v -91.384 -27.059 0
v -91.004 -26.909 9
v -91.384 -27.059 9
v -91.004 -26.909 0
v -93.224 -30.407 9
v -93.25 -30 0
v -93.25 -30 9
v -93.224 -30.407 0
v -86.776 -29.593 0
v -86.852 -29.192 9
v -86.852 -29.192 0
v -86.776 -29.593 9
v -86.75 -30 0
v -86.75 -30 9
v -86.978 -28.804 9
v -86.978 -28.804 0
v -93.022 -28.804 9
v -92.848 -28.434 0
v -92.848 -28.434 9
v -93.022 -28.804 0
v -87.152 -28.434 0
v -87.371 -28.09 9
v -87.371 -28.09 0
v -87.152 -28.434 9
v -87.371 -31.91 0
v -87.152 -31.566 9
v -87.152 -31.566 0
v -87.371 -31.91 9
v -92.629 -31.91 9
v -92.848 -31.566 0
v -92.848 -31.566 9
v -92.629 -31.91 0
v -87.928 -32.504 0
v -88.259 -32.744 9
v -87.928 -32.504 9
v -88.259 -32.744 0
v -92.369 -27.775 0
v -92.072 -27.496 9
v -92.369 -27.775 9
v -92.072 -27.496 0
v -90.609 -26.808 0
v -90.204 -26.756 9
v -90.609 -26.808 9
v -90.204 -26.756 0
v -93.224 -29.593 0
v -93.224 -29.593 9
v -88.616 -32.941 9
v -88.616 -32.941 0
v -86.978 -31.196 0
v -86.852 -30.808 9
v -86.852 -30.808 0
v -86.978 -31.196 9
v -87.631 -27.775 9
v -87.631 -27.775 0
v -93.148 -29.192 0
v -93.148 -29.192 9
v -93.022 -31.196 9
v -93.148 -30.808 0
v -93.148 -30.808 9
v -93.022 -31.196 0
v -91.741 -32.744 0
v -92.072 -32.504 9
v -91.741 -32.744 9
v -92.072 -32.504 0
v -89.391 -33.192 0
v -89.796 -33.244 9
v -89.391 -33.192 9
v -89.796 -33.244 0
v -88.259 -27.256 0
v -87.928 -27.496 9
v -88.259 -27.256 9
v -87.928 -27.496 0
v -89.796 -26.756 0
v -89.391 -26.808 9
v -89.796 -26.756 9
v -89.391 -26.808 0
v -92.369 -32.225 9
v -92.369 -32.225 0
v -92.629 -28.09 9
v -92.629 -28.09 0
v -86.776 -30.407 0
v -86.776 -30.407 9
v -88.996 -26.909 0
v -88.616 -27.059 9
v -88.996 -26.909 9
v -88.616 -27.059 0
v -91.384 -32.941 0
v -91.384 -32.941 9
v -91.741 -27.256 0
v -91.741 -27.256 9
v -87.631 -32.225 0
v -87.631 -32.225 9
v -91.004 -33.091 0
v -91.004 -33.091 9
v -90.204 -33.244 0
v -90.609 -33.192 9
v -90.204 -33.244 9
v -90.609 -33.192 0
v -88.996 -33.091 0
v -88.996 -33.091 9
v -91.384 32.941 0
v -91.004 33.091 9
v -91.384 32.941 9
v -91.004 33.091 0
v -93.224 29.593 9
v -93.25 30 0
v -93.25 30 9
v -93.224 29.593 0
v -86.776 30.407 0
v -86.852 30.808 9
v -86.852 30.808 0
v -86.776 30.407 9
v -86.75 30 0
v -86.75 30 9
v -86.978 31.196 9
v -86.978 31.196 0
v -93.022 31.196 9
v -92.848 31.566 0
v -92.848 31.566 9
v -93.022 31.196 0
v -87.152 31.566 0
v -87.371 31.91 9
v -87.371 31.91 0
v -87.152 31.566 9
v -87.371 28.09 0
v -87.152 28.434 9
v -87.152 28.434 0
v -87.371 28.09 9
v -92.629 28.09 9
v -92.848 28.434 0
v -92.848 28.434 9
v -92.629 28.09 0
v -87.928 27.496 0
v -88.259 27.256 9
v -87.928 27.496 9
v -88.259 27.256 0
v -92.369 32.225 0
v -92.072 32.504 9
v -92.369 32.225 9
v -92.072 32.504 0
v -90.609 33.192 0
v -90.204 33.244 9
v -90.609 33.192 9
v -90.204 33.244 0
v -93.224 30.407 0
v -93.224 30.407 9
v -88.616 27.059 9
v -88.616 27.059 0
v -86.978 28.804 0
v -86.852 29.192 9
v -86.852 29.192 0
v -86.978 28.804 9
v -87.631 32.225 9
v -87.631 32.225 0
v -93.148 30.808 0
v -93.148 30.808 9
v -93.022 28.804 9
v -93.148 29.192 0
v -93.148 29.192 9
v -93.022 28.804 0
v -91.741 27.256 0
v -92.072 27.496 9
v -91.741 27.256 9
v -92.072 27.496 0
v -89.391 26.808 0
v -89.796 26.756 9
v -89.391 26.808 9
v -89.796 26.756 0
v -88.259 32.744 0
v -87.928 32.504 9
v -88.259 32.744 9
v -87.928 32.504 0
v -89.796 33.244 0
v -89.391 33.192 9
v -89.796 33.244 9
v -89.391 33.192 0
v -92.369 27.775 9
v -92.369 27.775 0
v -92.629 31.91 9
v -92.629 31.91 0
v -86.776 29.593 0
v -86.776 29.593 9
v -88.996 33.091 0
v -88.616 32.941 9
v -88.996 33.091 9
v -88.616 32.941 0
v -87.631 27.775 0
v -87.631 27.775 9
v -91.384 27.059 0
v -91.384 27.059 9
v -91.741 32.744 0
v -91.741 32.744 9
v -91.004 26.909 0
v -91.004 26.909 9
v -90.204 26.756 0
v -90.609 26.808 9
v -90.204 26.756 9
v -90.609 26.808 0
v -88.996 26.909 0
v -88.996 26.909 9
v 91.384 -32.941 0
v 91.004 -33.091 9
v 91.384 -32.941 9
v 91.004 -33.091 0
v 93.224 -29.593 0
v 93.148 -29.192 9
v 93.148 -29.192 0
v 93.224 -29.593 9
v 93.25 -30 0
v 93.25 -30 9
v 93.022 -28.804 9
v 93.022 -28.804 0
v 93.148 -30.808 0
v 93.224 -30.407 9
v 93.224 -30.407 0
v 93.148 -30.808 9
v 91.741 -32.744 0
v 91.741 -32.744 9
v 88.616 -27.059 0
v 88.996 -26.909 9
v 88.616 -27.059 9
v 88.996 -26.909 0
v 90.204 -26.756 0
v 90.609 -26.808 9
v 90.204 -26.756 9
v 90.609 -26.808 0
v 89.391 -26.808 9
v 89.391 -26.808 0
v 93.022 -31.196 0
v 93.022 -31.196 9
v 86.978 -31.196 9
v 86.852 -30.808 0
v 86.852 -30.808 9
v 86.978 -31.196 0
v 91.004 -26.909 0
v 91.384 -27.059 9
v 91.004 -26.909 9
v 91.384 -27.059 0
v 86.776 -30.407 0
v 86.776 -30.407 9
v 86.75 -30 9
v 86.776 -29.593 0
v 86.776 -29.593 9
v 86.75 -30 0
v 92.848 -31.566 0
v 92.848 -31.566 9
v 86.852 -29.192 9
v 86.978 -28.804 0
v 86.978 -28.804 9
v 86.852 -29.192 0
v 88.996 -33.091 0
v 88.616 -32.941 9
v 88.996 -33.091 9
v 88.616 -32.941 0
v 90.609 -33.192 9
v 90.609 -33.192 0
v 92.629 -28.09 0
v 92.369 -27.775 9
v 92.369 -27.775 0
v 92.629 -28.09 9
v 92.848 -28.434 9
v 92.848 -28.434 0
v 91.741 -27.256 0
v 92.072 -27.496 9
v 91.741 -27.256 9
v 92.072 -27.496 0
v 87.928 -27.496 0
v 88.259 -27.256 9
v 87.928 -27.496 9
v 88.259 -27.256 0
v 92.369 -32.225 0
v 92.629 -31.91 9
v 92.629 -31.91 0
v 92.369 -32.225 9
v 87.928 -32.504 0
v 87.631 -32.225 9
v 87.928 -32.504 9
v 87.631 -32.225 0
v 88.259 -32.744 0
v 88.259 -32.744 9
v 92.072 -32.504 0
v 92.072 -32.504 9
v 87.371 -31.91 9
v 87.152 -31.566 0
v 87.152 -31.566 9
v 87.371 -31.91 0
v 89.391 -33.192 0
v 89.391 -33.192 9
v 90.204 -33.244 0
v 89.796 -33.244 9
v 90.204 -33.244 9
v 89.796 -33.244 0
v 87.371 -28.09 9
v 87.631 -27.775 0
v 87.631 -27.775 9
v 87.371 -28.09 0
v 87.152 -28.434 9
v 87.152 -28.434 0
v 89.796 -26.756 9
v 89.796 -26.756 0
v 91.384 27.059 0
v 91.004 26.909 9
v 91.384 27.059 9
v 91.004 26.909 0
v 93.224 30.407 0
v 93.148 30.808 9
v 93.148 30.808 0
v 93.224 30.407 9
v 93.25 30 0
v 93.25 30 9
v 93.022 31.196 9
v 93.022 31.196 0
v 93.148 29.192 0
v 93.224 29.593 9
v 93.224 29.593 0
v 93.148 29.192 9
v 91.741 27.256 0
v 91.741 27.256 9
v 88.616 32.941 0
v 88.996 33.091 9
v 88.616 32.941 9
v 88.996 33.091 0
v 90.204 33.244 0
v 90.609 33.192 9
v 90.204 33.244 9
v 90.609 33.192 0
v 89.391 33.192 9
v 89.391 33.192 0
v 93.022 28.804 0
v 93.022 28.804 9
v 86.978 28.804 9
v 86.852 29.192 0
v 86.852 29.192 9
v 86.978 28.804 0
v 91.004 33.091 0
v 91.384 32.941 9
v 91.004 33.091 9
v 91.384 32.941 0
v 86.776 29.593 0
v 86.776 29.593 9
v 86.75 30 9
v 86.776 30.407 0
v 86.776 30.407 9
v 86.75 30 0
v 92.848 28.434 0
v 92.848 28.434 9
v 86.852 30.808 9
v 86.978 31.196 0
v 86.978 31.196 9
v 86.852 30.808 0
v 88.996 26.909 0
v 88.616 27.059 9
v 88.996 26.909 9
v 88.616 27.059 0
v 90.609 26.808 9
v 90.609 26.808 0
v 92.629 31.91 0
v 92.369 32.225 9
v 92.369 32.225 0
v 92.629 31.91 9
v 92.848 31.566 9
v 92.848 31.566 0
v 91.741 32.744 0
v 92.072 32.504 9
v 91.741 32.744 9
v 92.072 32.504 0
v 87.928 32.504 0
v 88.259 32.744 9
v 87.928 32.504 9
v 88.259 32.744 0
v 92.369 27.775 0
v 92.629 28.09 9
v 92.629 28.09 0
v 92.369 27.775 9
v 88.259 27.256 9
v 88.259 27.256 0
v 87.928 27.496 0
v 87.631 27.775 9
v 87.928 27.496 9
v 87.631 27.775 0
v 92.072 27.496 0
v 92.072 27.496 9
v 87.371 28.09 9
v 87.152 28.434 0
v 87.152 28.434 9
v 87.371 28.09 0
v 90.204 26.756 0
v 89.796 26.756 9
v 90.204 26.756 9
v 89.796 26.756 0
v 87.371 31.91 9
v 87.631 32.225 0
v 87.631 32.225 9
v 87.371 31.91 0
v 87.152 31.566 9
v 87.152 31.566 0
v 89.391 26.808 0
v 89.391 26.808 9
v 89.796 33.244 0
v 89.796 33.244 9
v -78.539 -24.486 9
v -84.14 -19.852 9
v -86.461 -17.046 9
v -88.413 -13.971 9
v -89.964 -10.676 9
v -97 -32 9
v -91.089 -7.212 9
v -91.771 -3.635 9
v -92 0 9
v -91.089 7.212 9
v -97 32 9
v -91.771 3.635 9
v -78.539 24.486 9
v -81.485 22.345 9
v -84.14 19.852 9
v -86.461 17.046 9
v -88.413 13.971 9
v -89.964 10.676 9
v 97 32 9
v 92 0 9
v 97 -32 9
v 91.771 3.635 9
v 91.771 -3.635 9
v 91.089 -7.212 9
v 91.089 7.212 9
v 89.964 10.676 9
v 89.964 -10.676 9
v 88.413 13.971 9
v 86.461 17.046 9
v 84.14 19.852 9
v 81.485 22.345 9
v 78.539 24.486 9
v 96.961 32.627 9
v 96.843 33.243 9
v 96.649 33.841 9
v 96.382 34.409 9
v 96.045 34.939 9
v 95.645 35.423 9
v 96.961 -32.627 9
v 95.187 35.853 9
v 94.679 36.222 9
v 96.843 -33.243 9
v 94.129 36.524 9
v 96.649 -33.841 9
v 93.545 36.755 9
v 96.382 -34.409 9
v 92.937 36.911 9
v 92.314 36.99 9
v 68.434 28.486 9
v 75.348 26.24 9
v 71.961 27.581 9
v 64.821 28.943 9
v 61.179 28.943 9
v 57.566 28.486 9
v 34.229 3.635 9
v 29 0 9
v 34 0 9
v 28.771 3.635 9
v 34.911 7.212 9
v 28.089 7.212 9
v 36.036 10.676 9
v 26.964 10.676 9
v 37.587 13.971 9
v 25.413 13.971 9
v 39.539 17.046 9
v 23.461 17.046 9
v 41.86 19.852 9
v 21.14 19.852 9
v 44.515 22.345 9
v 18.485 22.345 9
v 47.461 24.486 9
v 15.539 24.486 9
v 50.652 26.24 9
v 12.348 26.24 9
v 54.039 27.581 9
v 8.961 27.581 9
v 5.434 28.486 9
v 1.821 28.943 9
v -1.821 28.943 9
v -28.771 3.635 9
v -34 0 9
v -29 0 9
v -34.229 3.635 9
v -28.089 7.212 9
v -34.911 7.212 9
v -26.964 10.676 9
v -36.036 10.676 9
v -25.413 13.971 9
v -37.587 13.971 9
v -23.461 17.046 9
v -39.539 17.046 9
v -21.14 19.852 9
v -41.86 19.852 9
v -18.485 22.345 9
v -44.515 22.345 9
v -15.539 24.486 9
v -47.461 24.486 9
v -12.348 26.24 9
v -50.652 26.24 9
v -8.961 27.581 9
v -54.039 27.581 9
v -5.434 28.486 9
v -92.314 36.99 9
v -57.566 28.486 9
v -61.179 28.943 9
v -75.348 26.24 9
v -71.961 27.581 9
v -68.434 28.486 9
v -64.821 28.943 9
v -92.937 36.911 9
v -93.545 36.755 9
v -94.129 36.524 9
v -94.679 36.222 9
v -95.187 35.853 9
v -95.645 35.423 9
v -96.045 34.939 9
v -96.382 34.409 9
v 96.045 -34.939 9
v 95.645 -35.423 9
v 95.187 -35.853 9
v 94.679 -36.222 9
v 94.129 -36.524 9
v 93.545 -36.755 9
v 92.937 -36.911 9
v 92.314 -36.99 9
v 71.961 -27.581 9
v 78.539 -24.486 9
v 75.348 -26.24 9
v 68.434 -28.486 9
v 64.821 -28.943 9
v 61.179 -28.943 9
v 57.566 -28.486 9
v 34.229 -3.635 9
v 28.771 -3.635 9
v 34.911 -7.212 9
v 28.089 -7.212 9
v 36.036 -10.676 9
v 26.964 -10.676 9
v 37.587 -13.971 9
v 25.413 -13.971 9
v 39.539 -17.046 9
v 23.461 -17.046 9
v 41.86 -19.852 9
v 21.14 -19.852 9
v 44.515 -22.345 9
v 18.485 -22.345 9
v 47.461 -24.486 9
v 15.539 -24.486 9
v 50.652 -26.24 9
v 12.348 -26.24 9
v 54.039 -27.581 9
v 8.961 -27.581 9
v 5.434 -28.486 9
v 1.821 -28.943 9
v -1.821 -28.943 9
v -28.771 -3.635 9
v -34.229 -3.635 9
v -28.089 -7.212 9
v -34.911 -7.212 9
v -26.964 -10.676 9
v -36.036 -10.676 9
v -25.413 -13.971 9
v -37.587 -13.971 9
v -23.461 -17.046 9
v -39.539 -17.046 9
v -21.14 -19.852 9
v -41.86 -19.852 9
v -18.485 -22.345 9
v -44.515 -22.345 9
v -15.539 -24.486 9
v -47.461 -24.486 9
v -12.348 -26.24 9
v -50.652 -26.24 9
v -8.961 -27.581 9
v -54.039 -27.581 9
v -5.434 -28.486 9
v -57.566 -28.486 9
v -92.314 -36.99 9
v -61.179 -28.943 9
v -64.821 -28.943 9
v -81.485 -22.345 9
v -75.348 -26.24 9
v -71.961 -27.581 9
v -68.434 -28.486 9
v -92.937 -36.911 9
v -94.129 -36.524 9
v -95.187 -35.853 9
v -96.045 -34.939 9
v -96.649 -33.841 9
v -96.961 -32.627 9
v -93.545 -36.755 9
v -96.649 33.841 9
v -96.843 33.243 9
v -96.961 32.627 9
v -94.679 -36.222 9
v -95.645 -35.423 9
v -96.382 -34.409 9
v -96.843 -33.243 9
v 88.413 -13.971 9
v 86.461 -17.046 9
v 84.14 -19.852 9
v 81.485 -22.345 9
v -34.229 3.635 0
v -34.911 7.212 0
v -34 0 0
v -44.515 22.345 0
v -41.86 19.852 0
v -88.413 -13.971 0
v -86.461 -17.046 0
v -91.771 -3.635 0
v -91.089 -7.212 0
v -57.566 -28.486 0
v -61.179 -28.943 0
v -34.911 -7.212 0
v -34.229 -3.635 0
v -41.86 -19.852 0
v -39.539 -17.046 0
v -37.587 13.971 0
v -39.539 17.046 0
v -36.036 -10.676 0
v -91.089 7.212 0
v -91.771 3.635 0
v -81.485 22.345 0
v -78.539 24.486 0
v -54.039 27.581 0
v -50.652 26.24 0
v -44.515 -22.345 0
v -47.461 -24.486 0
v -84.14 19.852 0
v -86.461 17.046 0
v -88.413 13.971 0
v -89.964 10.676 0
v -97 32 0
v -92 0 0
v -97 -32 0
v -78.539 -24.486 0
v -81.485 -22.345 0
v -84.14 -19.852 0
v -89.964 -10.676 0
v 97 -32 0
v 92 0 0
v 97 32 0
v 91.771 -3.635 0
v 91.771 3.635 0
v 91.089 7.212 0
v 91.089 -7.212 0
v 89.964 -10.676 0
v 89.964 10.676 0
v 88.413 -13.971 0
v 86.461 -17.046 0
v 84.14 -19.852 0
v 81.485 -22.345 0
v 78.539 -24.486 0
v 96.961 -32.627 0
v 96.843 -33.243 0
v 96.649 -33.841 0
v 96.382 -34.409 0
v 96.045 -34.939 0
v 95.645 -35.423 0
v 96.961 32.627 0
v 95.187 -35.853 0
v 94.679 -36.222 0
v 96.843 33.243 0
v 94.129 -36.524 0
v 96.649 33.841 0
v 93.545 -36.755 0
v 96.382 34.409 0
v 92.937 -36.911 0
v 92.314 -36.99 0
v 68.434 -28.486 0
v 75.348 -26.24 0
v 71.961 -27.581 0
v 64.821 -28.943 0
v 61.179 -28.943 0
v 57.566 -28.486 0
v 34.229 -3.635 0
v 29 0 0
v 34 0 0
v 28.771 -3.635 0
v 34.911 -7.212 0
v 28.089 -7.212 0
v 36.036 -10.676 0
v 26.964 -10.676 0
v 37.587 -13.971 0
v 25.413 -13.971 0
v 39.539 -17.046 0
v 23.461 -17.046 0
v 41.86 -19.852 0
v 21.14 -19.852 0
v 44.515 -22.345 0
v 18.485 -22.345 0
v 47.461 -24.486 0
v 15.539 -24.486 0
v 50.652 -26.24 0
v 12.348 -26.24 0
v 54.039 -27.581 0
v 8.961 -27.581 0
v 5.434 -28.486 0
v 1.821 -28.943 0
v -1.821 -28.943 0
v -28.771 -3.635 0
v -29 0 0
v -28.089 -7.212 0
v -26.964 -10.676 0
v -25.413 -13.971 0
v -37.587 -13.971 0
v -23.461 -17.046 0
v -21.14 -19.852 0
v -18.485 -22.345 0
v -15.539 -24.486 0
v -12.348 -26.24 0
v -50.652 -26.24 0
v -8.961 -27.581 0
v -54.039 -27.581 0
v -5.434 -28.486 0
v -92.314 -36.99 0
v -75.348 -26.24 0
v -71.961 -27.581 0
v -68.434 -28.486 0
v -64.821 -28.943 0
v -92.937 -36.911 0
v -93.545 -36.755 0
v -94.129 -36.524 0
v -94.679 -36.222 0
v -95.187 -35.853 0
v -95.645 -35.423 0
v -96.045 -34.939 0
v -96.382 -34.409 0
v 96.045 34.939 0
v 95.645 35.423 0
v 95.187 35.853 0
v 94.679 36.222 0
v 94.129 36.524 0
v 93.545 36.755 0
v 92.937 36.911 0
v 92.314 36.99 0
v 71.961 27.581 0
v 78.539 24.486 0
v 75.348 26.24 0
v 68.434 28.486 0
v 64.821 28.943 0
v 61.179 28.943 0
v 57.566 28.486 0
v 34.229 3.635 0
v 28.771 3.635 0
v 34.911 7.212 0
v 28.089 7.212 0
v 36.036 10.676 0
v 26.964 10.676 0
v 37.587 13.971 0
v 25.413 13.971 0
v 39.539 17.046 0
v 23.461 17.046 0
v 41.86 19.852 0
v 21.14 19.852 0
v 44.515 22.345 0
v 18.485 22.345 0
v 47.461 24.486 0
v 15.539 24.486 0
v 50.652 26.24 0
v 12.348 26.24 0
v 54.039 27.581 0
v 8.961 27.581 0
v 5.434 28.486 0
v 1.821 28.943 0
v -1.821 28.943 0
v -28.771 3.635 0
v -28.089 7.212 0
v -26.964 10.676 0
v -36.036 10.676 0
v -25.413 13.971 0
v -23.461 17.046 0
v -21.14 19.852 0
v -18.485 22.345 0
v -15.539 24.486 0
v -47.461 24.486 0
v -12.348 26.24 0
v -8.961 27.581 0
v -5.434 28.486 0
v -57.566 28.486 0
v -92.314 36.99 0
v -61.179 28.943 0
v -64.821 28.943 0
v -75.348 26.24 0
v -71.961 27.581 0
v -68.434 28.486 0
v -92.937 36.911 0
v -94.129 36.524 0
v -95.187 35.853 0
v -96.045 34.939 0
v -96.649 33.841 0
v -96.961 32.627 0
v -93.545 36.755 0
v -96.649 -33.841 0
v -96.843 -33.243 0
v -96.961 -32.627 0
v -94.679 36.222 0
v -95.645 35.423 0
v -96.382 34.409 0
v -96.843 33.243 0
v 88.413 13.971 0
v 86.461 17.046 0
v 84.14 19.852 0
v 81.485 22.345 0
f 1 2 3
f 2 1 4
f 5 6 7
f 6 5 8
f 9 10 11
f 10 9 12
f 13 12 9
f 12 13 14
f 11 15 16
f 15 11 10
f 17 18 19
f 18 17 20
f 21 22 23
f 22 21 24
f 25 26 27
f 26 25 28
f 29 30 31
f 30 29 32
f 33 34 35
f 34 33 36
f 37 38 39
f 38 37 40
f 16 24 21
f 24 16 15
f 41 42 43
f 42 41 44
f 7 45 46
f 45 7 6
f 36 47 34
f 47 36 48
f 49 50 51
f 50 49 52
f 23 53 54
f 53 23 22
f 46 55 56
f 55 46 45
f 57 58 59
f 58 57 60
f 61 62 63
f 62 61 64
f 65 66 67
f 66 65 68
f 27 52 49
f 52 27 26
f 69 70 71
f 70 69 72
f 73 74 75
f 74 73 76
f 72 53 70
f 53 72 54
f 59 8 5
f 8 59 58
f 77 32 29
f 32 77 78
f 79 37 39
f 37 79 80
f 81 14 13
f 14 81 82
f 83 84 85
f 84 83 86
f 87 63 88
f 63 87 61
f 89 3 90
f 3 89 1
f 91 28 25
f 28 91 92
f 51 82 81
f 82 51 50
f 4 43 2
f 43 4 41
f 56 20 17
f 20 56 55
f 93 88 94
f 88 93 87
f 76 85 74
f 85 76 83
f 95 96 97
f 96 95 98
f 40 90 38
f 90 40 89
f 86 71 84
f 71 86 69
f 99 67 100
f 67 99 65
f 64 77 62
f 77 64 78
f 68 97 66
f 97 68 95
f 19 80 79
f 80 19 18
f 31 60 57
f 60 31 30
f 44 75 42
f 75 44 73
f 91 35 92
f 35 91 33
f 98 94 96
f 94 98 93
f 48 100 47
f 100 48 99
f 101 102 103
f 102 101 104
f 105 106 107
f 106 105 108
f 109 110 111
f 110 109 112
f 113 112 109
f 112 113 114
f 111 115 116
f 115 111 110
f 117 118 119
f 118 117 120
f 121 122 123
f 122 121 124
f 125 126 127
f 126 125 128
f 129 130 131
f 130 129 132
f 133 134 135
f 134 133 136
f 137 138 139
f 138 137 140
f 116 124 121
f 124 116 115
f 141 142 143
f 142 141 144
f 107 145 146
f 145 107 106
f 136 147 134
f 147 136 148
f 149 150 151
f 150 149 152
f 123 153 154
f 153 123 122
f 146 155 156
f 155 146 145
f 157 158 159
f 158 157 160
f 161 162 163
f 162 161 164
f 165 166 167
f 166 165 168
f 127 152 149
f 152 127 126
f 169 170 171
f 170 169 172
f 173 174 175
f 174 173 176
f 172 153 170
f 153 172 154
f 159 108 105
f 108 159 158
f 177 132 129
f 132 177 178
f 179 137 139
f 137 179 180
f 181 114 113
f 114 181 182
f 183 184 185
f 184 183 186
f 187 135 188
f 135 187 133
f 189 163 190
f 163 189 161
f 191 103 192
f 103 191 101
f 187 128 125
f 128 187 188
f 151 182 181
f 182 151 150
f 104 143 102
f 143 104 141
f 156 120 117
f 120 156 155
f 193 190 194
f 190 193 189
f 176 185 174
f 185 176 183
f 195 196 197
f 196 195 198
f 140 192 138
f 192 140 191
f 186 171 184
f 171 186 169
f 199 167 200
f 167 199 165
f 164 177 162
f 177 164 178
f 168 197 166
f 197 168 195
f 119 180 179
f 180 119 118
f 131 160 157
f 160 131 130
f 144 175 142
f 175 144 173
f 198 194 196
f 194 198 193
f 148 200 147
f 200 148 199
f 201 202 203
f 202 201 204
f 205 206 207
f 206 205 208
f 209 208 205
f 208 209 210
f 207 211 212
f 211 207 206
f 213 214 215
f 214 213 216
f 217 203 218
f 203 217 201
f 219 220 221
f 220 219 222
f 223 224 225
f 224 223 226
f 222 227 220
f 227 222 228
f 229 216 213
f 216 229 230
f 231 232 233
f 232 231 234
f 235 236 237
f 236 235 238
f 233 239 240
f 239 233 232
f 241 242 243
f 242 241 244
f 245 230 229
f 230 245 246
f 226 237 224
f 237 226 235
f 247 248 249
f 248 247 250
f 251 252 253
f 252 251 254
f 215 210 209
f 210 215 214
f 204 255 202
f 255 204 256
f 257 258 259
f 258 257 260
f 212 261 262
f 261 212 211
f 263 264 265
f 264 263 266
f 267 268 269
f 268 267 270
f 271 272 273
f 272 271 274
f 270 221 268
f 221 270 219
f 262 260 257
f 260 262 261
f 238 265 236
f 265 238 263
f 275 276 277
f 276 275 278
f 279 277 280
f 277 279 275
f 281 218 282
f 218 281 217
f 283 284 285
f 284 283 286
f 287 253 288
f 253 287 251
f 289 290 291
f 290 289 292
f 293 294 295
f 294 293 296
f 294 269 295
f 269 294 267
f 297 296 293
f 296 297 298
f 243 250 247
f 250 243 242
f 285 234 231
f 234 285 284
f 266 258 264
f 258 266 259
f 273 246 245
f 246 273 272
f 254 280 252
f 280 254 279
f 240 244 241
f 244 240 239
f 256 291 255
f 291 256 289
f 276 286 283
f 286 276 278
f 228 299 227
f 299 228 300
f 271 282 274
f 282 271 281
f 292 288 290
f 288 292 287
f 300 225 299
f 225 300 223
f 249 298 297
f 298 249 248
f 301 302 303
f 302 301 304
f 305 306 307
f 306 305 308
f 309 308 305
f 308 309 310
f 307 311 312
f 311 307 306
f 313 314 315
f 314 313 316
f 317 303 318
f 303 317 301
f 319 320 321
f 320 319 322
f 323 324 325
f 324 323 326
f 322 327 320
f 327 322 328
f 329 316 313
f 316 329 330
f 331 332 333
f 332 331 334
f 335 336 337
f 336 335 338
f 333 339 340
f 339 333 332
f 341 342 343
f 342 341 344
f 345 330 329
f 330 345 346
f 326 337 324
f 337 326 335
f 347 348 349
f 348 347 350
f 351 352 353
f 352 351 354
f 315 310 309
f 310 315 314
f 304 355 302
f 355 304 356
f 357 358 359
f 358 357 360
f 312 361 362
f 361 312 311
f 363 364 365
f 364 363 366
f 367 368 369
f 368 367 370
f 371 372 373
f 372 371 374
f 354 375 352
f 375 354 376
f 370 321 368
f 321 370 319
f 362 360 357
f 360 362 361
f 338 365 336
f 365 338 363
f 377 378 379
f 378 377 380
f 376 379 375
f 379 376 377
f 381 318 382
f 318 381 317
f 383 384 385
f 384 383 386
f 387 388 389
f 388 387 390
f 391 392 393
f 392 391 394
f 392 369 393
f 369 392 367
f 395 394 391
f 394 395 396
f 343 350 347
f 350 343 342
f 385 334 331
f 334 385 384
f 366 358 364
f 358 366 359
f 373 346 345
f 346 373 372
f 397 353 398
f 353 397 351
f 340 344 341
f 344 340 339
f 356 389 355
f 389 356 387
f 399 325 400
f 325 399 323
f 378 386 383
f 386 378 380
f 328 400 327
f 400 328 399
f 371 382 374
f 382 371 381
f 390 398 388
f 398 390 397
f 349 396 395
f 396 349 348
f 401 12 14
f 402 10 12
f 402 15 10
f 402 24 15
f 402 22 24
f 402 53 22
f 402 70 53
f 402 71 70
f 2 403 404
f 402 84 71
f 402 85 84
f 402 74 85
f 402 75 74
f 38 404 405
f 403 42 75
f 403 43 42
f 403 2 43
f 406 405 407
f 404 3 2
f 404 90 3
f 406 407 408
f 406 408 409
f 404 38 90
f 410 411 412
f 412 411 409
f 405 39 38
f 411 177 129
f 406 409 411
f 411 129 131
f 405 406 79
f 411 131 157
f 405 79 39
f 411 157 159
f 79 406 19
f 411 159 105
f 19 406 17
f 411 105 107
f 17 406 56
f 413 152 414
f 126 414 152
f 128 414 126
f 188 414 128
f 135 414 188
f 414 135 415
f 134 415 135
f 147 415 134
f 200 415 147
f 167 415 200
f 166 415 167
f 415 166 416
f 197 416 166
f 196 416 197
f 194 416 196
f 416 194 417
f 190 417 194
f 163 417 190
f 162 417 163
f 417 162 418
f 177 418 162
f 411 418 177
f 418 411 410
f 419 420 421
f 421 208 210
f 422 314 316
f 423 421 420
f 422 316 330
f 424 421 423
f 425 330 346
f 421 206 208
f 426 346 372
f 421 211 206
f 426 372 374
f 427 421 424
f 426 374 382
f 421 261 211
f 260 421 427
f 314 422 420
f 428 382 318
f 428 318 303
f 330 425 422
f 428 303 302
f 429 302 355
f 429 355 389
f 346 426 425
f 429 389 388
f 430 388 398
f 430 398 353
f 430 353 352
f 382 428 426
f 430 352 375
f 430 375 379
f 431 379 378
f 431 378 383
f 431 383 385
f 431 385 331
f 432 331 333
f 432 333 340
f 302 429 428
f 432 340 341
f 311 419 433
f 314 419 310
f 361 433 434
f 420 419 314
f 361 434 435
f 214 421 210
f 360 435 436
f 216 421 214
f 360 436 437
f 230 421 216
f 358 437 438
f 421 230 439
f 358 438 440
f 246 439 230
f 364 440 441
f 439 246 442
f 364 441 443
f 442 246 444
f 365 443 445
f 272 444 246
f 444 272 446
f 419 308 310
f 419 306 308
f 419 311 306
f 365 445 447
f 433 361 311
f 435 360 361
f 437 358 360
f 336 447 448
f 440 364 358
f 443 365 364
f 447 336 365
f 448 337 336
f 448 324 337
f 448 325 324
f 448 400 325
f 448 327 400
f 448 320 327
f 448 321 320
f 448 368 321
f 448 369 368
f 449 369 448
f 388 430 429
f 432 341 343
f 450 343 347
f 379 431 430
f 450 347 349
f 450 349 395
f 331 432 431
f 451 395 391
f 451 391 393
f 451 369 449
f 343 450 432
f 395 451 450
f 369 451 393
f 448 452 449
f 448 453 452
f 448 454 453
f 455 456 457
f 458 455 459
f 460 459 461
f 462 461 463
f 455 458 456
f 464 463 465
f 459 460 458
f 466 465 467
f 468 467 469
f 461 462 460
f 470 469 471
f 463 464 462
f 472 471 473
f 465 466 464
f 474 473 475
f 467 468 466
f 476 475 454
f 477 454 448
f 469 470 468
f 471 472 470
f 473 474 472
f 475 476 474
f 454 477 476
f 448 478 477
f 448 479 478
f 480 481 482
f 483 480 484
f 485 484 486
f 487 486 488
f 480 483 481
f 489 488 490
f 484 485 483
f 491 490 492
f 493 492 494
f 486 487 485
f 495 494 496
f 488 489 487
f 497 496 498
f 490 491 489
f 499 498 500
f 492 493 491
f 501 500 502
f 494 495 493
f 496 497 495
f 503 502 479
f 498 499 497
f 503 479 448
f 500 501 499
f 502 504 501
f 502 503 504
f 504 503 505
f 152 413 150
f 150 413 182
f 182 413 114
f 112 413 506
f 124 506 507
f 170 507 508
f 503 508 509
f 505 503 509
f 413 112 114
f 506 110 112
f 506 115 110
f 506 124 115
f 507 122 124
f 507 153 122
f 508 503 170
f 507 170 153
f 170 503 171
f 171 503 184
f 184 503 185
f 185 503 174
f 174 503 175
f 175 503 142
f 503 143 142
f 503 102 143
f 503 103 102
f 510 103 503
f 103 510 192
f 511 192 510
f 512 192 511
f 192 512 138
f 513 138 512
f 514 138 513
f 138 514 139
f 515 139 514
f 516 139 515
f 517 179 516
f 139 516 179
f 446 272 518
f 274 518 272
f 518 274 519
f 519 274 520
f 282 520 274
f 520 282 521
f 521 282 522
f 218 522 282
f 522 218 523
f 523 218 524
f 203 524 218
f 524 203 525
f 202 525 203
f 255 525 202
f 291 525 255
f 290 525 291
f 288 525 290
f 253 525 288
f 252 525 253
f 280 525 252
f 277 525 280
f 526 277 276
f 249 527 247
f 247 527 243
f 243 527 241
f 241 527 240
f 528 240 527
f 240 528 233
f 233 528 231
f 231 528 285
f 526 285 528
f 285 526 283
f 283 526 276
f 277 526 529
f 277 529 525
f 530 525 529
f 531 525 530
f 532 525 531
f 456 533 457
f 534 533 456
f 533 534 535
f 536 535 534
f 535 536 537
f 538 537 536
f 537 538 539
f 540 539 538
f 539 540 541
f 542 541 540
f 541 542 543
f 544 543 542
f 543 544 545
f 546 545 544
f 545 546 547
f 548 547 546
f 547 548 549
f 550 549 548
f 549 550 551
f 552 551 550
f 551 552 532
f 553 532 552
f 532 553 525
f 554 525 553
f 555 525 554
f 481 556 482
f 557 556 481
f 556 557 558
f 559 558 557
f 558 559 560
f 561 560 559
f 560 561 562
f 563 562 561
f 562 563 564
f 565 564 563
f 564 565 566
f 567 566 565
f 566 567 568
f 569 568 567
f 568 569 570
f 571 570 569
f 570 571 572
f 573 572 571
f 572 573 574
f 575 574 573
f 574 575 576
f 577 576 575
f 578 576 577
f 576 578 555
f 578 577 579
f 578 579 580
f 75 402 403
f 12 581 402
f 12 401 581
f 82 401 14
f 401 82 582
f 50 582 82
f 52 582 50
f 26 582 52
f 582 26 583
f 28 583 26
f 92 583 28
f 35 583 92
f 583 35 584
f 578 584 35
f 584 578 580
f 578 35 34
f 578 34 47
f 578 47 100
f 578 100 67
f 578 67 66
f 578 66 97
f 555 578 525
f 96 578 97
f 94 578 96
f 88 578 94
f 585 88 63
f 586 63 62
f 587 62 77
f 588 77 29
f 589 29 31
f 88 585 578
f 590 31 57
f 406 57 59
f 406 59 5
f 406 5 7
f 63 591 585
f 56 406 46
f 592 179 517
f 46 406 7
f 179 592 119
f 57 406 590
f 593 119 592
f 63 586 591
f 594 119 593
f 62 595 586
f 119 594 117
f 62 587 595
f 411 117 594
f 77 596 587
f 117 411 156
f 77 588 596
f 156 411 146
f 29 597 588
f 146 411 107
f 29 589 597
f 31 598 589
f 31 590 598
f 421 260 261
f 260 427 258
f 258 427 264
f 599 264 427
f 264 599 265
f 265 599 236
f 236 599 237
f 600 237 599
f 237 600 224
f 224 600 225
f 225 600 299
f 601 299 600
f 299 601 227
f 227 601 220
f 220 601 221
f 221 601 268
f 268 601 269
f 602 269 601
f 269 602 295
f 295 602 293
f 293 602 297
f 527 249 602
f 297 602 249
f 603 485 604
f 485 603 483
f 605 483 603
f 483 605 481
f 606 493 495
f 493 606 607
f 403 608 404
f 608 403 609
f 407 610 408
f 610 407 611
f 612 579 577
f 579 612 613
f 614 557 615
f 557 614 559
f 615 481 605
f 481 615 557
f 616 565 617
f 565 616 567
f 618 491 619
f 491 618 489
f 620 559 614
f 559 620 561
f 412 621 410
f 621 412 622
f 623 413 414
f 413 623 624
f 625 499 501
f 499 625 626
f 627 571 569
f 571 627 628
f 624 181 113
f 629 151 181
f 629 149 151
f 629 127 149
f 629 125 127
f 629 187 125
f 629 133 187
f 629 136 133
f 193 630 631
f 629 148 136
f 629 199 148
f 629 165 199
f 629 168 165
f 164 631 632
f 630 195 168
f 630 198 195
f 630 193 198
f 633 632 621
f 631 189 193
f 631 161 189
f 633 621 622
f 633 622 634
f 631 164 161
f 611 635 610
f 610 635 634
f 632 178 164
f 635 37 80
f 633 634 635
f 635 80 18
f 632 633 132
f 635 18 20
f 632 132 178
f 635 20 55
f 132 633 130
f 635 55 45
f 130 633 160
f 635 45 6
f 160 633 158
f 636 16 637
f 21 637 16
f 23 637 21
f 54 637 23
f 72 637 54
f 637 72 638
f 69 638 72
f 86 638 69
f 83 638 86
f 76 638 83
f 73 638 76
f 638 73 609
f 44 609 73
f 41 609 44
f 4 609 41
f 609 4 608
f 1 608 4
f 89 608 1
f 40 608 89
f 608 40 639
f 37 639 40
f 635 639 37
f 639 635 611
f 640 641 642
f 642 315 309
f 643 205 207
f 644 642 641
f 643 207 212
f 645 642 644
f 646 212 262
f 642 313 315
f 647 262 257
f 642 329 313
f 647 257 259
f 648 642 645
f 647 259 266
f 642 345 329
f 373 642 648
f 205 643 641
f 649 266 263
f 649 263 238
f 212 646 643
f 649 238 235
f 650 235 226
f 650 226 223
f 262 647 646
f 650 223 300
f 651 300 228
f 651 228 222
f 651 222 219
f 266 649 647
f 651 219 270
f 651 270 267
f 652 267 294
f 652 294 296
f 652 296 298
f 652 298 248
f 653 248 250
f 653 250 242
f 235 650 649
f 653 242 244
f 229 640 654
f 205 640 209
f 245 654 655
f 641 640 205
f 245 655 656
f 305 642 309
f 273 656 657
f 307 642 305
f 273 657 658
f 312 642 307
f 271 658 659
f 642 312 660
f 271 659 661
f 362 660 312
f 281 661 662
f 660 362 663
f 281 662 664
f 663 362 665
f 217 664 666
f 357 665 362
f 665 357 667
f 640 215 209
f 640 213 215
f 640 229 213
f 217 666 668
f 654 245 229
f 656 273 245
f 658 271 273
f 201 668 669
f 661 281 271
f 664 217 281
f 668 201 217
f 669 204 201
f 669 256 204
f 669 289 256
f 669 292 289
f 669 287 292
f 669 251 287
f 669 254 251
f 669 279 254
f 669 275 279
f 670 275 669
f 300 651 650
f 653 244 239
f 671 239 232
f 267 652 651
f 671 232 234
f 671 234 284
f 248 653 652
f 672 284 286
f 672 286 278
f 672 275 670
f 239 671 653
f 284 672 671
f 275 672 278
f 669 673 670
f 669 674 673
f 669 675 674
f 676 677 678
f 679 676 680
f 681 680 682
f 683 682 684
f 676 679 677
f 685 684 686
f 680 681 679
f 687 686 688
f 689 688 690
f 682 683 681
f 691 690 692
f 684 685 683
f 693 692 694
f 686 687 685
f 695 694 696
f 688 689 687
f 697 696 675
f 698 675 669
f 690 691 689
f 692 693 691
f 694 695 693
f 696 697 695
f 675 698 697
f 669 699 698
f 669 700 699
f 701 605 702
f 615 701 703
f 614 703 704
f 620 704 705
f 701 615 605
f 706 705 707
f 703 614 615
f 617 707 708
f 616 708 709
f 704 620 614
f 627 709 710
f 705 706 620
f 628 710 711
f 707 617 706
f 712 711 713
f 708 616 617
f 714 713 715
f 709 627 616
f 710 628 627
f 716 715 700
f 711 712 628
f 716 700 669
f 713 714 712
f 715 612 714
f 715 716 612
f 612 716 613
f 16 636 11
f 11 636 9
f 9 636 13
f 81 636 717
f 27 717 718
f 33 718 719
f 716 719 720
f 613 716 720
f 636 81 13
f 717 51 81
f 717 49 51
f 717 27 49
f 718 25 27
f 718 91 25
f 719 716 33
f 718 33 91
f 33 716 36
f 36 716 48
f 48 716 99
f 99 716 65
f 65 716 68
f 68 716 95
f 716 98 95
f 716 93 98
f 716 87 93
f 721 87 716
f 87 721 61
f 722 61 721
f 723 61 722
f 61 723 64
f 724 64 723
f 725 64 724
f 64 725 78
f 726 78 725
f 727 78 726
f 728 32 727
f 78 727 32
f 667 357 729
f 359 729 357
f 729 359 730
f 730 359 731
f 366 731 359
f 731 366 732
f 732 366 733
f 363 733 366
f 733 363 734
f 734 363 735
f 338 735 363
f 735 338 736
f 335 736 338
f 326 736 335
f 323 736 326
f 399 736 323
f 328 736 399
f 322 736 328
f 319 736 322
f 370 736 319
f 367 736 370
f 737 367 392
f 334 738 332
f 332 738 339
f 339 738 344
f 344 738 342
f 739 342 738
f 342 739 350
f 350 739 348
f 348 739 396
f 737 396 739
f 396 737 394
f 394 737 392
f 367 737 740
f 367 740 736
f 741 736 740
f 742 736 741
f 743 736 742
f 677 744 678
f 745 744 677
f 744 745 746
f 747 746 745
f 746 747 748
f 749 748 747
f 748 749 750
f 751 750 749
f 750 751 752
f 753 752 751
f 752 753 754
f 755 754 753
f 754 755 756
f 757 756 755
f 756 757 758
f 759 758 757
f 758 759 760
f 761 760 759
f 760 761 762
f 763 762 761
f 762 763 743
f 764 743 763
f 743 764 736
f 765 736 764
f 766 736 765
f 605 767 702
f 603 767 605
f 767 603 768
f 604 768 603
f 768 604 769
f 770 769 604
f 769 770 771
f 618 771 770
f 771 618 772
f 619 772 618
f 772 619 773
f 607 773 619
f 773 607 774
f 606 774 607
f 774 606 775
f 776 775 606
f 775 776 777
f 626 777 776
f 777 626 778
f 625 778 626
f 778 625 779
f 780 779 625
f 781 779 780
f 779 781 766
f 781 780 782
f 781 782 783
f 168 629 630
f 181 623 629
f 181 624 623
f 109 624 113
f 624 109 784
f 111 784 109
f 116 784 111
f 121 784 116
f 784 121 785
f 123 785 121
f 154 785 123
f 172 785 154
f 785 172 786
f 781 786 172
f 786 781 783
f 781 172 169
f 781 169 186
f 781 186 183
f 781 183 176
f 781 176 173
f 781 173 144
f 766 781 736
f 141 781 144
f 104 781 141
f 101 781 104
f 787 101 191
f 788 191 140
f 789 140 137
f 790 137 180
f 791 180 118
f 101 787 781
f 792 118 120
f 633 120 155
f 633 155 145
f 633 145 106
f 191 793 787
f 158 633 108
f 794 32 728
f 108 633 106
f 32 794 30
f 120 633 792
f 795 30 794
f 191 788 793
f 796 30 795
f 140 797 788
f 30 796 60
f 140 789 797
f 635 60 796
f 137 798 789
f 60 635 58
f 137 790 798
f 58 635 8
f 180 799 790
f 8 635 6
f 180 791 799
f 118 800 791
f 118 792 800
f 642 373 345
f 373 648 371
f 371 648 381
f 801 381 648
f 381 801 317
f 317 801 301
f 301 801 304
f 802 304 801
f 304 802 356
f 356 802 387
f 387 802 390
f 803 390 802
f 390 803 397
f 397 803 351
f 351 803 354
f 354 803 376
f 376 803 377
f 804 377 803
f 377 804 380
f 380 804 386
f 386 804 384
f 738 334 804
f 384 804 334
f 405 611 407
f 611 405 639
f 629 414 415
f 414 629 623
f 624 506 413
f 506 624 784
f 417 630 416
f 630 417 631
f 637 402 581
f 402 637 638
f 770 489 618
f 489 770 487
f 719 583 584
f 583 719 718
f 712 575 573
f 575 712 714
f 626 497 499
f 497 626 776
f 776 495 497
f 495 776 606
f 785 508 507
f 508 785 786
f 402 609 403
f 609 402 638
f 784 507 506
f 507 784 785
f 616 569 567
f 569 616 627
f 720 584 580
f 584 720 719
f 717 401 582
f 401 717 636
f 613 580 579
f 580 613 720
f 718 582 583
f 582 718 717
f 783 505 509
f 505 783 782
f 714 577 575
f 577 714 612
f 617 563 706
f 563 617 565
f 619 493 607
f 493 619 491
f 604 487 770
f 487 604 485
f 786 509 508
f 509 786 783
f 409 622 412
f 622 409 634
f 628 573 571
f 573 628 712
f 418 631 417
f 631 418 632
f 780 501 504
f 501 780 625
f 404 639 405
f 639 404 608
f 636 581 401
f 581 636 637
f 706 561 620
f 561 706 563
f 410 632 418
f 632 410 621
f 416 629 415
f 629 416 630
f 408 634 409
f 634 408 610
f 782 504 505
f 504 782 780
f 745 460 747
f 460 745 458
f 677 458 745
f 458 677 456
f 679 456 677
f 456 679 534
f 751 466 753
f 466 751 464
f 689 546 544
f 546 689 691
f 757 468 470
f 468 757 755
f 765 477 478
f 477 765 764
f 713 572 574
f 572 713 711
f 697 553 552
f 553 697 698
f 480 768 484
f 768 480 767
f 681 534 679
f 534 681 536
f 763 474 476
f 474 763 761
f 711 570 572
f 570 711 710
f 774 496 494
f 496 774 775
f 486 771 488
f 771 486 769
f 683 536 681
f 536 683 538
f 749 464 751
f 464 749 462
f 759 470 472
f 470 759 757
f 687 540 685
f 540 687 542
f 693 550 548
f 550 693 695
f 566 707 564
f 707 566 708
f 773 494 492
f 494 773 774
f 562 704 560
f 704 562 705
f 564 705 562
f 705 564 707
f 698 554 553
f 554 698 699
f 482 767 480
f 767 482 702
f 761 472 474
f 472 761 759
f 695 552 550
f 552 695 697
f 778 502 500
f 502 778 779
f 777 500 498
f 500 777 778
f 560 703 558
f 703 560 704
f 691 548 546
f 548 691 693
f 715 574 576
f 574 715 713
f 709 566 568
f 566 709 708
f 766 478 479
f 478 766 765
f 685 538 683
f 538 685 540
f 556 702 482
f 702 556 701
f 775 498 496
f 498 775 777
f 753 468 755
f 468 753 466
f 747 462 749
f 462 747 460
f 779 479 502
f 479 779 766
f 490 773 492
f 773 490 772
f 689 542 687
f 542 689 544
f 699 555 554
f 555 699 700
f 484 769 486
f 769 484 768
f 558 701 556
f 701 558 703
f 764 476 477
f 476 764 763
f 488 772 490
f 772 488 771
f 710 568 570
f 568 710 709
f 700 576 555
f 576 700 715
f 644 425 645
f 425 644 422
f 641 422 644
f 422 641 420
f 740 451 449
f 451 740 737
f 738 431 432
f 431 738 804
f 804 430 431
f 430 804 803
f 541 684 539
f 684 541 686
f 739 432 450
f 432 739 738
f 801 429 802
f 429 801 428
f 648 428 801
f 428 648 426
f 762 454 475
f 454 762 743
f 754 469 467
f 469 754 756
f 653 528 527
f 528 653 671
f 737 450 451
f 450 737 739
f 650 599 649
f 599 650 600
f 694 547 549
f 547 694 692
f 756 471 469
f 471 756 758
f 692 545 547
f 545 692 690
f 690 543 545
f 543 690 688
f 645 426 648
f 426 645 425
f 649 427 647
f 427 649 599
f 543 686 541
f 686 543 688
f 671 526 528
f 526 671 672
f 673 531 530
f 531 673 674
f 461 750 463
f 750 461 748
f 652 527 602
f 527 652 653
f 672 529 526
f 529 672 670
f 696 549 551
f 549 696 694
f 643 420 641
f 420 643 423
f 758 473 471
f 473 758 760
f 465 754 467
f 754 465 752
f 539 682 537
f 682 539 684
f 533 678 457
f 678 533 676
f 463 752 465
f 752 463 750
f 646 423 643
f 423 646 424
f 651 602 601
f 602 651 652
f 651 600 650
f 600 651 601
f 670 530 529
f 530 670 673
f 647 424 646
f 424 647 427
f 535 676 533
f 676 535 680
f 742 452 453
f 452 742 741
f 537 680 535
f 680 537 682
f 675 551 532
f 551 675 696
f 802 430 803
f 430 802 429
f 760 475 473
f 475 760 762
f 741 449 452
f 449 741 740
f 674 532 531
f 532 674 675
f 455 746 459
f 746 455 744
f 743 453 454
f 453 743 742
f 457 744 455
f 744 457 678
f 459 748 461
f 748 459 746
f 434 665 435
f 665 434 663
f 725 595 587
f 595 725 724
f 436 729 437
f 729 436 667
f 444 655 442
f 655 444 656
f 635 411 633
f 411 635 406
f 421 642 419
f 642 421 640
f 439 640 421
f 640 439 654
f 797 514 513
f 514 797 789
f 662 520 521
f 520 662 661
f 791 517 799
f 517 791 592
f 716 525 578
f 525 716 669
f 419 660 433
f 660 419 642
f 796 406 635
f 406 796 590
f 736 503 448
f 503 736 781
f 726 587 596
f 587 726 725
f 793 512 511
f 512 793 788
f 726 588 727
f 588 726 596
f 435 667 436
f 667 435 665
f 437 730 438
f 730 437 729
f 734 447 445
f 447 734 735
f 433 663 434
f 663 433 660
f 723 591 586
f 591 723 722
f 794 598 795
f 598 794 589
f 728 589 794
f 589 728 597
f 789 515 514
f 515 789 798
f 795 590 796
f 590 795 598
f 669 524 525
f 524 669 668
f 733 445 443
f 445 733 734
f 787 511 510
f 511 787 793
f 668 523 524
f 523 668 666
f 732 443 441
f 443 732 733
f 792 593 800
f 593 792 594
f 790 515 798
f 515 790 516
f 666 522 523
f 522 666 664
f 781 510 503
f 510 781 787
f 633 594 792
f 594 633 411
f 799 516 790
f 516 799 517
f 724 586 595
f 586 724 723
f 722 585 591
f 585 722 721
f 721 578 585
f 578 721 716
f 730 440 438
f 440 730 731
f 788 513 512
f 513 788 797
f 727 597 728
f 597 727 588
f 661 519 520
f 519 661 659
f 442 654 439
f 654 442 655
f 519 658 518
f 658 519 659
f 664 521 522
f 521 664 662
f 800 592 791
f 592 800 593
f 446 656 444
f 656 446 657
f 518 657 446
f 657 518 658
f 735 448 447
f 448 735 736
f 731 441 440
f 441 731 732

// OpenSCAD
$fn = 50;


difference() {
	union() {
		hull() {
			translate(v = [-92.0000000000, 32.0000000000, 0]) {
				cylinder(h = 9, r = 5);
			}
			translate(v = [92.0000000000, 32.0000000000, 0]) {
				cylinder(h = 9, r = 5);
			}
			translate(v = [-92.0000000000, -32.0000000000, 0]) {
				cylinder(h = 9, r = 5);
			}
			translate(v = [92.0000000000, -32.0000000000, 0]) {
				cylinder(h = 9, r = 5);
			}
		}
	}
	union() {
		#translate(v = [-90.0000000000, -30.0000000000, -100.0000000000]) {
			cylinder(h = 200, r = 3.2500000000);
		}
		#translate(v = [-90.0000000000, 30.0000000000, -100.0000000000]) {
			cylinder(h = 200, r = 3.2500000000);
		}
		#translate(v = [90.0000000000, -30.0000000000, -100.0000000000]) {
			cylinder(h = 200, r = 3.2500000000);
		}
		#translate(v = [90.0000000000, 30.0000000000, -100.0000000000]) {
			cylinder(h = 200, r = 3.2500000000);
		}
		#translate(v = [-63.0000000000, 0, 0]) {
			cylinder(h = 9, r = 29.0000000000);
		}
		#cylinder(h = 9, r = 29.0000000000);
		#translate(v = [63.0000000000, 0, 0]) {
			cylinder(h = 9, r = 29.0000000000);
		}
	}
}
